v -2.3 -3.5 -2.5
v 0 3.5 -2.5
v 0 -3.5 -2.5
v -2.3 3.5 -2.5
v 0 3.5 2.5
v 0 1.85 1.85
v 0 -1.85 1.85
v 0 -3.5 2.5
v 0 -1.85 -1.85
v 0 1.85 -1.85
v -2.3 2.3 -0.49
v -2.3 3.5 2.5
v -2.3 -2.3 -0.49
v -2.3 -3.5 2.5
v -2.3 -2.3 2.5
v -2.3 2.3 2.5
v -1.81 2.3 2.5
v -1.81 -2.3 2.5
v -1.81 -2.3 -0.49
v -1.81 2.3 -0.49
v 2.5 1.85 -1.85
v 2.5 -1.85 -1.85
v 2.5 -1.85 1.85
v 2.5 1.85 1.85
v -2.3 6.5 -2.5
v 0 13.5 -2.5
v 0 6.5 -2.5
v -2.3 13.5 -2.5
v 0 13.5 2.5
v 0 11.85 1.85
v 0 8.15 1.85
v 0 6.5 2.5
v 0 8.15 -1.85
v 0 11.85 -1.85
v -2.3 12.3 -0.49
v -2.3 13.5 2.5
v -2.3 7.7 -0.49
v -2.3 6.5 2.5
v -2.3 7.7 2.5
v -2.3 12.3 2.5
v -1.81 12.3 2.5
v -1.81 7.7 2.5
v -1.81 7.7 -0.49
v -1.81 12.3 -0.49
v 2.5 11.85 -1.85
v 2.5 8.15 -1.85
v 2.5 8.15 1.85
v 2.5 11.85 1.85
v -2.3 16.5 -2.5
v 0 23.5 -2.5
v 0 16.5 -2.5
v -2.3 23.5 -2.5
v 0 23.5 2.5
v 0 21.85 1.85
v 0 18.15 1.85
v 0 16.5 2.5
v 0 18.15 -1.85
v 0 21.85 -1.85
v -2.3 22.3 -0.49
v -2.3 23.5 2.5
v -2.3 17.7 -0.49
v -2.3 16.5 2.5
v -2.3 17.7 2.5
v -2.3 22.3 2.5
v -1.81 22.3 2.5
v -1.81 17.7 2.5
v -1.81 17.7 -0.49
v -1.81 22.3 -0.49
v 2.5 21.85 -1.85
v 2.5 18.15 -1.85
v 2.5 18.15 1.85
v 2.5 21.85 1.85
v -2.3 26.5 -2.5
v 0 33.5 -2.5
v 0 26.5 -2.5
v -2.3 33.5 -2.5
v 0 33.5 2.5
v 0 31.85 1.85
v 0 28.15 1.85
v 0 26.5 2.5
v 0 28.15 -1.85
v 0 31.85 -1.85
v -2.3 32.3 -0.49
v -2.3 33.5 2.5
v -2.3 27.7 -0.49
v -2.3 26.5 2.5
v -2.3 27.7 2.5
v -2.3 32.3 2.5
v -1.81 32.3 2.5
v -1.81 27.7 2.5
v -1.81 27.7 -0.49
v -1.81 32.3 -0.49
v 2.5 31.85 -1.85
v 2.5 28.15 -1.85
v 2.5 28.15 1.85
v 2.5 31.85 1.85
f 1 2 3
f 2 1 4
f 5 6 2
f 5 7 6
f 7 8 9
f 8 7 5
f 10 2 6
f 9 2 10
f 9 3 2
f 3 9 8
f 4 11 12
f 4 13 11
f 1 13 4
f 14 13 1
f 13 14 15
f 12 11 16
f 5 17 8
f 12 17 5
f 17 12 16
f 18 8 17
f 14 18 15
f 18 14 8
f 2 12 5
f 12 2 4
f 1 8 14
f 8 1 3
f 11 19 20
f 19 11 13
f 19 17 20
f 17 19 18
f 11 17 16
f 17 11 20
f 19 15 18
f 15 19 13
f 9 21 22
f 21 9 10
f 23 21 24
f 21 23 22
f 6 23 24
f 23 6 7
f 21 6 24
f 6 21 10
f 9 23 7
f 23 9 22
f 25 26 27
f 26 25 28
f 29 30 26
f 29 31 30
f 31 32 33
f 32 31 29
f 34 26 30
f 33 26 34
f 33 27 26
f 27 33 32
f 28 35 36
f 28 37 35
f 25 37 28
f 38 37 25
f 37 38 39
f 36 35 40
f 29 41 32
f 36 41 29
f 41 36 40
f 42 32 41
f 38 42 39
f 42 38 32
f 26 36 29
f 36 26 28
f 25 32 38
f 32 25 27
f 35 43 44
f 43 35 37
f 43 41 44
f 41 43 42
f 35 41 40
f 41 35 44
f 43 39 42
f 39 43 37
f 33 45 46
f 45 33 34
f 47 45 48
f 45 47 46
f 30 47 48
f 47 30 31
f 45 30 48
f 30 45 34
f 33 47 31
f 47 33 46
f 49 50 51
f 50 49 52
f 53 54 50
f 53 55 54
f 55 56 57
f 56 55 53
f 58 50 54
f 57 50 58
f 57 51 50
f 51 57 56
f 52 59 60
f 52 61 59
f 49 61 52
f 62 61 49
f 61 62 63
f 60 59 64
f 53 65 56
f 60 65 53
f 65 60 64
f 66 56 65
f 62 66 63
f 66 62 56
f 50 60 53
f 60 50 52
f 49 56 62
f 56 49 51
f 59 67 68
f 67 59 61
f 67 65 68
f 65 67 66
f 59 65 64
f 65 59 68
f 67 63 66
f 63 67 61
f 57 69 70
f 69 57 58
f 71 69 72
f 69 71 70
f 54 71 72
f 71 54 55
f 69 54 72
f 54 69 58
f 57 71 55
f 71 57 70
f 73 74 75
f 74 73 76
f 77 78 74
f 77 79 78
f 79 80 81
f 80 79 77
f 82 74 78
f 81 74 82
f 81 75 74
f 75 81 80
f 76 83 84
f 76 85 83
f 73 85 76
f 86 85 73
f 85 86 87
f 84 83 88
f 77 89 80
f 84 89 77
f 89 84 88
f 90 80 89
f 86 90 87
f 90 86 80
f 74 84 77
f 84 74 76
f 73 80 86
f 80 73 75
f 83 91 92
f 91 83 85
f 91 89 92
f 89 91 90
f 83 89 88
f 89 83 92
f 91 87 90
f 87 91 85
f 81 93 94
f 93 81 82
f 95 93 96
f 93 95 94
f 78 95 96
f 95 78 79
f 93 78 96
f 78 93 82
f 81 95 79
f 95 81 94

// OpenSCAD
  //h_mu = 7.6;  
  h_mu = 10;  
    
   for (i = [0,1,2,3]) {
    translate([0, h_mu*i, 0])
      rotate([0,90,0]) union() {
          translate([0,0,2.5/2]) cube([3.7, 3.7, 2.5], center=true);
          difference() {
            translate([0,0,-2.3/2]) cube([5, 7, 2.3], center=true);
            #translate([-1.26,0,-2.8+0.8/2-0.01+0.2]) cube([3.5, 4.6, 0.8], center=true);
          }
      }
   }
